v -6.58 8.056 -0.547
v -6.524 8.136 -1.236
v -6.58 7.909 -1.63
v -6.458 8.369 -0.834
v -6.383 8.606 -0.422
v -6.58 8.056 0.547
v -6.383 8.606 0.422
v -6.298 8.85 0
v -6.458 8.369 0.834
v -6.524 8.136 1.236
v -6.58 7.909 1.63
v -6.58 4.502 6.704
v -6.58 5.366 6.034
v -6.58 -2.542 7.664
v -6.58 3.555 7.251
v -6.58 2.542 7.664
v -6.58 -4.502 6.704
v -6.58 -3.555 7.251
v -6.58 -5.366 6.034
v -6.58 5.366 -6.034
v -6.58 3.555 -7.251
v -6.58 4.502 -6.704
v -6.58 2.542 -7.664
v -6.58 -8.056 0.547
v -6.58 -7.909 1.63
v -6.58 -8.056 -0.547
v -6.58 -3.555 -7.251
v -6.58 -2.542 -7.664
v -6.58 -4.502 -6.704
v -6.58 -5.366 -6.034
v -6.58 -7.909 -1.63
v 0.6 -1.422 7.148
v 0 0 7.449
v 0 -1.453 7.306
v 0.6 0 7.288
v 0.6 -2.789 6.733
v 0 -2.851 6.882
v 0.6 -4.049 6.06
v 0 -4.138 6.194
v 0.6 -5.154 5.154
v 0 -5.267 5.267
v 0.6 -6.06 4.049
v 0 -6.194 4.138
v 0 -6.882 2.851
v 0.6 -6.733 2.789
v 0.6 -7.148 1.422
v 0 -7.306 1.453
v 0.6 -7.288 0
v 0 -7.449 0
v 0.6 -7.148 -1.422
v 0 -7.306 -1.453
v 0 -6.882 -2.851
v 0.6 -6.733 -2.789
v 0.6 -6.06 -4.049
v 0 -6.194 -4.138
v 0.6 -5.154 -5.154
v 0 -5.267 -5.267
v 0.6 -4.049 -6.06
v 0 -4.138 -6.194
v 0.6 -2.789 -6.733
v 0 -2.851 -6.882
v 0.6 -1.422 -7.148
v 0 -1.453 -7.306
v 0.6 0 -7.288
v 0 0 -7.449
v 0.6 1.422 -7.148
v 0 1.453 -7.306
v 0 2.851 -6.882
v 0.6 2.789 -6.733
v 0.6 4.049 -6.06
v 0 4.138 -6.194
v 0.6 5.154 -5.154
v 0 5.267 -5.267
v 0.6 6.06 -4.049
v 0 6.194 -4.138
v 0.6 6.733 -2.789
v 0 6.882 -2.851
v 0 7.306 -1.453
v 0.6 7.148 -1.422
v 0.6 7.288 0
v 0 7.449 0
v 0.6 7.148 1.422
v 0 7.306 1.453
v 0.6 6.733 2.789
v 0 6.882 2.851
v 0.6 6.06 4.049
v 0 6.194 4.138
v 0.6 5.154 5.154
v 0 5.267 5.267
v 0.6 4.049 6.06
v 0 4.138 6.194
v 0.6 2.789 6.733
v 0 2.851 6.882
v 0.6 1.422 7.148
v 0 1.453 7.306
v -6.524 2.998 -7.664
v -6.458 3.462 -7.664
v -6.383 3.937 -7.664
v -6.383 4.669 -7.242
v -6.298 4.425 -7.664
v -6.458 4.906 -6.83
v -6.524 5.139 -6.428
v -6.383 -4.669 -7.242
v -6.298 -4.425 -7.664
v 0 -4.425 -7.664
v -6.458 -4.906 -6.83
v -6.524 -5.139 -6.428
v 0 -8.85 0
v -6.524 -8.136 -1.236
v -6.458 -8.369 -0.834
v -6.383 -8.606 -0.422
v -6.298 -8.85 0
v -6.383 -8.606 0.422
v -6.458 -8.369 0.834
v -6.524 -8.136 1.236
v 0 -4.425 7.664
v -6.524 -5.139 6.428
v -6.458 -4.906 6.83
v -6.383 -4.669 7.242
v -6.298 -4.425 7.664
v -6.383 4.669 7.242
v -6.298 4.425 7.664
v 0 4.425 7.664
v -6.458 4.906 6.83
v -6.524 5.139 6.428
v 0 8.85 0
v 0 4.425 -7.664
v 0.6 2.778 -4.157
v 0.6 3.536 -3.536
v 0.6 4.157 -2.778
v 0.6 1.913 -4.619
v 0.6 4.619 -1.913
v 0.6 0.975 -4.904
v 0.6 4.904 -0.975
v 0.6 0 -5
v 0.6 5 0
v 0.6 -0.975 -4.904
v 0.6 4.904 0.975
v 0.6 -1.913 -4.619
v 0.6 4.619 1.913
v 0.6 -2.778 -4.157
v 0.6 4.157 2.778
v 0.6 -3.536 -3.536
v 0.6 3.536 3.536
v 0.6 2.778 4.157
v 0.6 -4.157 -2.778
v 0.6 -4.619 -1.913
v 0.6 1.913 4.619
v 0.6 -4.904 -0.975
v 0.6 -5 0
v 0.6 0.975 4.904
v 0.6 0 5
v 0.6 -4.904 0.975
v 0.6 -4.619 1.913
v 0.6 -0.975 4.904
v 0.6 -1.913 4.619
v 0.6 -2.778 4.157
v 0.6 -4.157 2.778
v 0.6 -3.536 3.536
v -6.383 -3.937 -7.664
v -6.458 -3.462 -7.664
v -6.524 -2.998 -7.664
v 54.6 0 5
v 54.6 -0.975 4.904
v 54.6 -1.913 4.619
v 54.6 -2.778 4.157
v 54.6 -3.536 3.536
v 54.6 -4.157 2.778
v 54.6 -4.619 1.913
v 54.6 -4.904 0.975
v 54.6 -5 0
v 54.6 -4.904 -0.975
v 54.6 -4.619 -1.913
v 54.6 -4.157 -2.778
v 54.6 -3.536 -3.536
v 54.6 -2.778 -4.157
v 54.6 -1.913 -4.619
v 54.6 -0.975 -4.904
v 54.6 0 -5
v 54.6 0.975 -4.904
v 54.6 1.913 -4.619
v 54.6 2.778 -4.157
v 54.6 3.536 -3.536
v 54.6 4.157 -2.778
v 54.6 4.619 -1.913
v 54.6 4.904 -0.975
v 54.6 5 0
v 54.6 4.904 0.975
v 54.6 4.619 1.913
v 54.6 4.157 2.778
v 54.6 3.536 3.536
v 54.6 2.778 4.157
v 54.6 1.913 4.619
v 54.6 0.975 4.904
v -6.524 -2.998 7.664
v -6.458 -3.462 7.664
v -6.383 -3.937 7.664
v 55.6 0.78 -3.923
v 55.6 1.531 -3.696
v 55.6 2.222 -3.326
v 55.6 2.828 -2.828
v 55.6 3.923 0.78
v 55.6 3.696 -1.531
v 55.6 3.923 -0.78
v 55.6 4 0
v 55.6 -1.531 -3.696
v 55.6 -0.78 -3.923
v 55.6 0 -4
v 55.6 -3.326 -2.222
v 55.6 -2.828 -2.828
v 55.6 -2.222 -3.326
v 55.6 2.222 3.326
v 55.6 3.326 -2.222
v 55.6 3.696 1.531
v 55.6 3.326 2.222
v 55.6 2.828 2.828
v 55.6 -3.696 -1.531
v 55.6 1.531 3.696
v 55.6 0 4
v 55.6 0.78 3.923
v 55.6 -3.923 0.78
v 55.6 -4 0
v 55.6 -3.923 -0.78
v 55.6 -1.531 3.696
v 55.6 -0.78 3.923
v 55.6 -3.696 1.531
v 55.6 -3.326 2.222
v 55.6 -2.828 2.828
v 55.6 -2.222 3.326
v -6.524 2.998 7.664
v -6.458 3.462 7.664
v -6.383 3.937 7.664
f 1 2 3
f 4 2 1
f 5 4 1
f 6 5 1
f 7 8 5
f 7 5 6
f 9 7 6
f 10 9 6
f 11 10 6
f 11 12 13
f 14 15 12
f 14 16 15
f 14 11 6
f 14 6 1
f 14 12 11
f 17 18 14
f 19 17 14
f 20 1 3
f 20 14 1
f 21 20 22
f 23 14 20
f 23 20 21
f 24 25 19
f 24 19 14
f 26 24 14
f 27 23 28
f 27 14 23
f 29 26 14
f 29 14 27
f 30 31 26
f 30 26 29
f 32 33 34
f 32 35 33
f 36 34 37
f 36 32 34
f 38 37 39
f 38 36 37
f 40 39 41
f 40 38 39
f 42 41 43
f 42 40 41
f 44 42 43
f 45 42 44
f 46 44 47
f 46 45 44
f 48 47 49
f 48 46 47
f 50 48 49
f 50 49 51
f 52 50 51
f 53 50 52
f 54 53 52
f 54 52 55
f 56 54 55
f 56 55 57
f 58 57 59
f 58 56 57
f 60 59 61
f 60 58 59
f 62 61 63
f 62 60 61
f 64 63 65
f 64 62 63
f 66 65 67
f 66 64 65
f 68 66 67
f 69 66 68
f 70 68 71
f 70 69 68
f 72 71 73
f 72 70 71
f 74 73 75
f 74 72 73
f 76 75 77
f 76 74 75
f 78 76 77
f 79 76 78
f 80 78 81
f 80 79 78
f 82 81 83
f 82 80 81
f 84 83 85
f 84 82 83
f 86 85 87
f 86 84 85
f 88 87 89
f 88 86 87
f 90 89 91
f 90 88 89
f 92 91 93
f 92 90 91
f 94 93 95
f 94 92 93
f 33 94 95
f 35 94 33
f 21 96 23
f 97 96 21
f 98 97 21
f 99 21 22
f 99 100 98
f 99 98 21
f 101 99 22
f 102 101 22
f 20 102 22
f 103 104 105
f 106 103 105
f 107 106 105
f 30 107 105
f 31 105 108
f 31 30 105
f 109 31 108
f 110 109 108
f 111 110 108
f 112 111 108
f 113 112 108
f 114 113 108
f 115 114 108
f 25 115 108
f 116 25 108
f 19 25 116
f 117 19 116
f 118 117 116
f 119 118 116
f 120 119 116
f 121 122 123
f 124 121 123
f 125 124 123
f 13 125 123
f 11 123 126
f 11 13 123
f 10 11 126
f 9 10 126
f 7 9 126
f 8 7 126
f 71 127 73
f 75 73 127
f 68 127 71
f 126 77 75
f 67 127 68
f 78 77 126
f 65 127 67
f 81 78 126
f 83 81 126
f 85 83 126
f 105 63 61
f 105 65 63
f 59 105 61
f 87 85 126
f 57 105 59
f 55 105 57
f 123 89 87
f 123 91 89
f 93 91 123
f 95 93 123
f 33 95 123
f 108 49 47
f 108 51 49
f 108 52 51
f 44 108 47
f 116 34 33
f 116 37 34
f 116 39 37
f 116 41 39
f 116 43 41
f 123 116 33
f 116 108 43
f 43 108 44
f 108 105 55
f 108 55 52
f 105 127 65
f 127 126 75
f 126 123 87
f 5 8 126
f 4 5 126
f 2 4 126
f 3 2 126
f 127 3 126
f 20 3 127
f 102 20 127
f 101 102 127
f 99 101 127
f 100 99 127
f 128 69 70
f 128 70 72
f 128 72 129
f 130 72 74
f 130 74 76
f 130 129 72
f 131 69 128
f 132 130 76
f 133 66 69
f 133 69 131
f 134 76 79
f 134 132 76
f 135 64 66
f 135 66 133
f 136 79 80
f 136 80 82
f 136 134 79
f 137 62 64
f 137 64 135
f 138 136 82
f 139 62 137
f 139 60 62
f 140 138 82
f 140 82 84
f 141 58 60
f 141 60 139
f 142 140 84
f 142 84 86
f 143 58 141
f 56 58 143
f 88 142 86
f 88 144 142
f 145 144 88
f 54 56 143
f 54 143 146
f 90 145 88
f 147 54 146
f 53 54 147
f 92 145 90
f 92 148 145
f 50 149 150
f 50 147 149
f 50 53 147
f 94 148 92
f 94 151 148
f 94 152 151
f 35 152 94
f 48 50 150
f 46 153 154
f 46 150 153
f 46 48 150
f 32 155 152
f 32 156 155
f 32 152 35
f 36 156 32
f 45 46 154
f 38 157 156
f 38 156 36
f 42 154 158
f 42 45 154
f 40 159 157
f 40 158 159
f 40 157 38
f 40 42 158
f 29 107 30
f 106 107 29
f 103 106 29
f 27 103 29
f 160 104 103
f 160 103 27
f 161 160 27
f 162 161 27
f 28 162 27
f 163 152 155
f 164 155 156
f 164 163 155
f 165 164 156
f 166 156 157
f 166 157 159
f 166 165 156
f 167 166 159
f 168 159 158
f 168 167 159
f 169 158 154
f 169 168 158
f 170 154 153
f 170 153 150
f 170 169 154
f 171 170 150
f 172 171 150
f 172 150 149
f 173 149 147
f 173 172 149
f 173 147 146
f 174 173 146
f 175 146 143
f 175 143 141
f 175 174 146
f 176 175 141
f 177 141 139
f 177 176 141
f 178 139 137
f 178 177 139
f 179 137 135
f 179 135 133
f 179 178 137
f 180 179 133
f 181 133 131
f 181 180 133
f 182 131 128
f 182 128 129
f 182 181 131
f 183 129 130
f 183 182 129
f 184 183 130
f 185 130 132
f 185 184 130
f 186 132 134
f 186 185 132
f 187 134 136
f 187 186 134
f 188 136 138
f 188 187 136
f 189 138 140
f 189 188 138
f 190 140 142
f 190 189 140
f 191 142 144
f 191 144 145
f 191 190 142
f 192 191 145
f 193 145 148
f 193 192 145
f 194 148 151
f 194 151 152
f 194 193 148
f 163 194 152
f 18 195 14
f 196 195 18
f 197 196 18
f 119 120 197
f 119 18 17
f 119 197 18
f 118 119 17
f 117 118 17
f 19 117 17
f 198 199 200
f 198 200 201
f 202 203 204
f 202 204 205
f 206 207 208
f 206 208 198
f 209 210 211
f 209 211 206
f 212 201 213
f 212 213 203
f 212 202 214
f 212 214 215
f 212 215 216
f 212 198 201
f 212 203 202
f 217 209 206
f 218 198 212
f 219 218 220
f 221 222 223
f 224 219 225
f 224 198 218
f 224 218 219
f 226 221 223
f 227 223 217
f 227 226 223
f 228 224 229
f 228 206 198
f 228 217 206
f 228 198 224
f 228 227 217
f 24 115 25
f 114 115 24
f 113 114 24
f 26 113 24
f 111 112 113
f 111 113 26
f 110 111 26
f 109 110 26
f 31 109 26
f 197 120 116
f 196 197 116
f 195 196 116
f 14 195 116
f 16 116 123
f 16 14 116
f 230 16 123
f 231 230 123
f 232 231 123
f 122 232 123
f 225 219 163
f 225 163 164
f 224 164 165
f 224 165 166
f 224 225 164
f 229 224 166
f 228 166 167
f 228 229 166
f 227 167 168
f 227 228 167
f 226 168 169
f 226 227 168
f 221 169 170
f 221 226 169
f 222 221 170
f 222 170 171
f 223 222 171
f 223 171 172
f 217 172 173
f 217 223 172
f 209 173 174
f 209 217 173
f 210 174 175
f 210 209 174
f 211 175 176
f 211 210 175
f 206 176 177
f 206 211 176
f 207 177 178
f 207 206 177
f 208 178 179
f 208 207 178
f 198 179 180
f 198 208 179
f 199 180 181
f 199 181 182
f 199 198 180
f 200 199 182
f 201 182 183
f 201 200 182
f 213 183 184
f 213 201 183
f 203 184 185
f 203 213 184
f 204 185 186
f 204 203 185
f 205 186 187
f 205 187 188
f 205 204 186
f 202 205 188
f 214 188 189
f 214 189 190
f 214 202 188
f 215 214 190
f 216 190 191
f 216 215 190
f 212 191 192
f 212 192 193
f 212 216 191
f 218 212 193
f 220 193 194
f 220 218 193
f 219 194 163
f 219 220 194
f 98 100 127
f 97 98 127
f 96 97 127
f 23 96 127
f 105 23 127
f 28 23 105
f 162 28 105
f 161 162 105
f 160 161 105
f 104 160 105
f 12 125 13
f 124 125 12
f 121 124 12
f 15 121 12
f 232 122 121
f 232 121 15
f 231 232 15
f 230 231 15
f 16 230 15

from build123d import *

# Parameters (mm, degrees)
SKETCH_2_OUTSIDE_W  = 33.106
SKETCH_2_OUTSIDE_H  = 33.106
CUT_EXTRUDE_1_DEPTH = 64.42710304
CHAMFER_1_SIZE      = 1


with BuildPart() as part:
    # Эскиз1 → Повернуть1 (revolve)
    with BuildSketch(Plane.XY, mode=Mode.PRIVATE) as revolve_1_sk:
        Polygon((-6.58, 0), (-6.58, 8.85), (0, 8.85), (0, 7.448974596), (0.6, 7.288205081), (0.6, 5), (55.6, 5), (55.6, 0), align=None)
    revolve(revolve_1_sk.sketch.rotate(Axis((-1000, 0, 0), (1, 0, 0)), 90), axis=Axis((-1000, 0, 0), (1, 0, 0)))

    # Эскиз2 outside → Вырез-Вытянуть1 (cut, through all)
    with BuildSketch(Plane.ZY.offset(6.58)):
        Rectangle(SKETCH_2_OUTSIDE_W, SKETCH_2_OUTSIDE_H)
        Polygon((0, -8.85), (7.664324823, -4.425), (7.664324823, 4.425), (0, 8.85), (-7.664324823, 4.425), (-7.664324823, -4.425), align=None, mode=Mode.SUBTRACT)
    extrude(amount=-CUT_EXTRUDE_1_DEPTH, mode=Mode.SUBTRACT)

    # Эскиз4 → Вырез-Повернуть1 (revolve, cut)
    with BuildSketch(Plane.XY):
        Polygon((-6.58, 8.075), (-6.297923068, 8.85), (-6.58, 8.85), align=None)
    revolve(axis=Axis((-1000, 0, 0), (1, 0, 0)), mode=Mode.SUBTRACT)

    # Фаска1
    chamfer_1_edges = [part.edges().sort_by_distance(p)[0] for p in [
        (55.6, 0, -5),
    ]]
    chamfer(chamfer_1_edges, length=CHAMFER_1_SIZE)


solid = part.part
